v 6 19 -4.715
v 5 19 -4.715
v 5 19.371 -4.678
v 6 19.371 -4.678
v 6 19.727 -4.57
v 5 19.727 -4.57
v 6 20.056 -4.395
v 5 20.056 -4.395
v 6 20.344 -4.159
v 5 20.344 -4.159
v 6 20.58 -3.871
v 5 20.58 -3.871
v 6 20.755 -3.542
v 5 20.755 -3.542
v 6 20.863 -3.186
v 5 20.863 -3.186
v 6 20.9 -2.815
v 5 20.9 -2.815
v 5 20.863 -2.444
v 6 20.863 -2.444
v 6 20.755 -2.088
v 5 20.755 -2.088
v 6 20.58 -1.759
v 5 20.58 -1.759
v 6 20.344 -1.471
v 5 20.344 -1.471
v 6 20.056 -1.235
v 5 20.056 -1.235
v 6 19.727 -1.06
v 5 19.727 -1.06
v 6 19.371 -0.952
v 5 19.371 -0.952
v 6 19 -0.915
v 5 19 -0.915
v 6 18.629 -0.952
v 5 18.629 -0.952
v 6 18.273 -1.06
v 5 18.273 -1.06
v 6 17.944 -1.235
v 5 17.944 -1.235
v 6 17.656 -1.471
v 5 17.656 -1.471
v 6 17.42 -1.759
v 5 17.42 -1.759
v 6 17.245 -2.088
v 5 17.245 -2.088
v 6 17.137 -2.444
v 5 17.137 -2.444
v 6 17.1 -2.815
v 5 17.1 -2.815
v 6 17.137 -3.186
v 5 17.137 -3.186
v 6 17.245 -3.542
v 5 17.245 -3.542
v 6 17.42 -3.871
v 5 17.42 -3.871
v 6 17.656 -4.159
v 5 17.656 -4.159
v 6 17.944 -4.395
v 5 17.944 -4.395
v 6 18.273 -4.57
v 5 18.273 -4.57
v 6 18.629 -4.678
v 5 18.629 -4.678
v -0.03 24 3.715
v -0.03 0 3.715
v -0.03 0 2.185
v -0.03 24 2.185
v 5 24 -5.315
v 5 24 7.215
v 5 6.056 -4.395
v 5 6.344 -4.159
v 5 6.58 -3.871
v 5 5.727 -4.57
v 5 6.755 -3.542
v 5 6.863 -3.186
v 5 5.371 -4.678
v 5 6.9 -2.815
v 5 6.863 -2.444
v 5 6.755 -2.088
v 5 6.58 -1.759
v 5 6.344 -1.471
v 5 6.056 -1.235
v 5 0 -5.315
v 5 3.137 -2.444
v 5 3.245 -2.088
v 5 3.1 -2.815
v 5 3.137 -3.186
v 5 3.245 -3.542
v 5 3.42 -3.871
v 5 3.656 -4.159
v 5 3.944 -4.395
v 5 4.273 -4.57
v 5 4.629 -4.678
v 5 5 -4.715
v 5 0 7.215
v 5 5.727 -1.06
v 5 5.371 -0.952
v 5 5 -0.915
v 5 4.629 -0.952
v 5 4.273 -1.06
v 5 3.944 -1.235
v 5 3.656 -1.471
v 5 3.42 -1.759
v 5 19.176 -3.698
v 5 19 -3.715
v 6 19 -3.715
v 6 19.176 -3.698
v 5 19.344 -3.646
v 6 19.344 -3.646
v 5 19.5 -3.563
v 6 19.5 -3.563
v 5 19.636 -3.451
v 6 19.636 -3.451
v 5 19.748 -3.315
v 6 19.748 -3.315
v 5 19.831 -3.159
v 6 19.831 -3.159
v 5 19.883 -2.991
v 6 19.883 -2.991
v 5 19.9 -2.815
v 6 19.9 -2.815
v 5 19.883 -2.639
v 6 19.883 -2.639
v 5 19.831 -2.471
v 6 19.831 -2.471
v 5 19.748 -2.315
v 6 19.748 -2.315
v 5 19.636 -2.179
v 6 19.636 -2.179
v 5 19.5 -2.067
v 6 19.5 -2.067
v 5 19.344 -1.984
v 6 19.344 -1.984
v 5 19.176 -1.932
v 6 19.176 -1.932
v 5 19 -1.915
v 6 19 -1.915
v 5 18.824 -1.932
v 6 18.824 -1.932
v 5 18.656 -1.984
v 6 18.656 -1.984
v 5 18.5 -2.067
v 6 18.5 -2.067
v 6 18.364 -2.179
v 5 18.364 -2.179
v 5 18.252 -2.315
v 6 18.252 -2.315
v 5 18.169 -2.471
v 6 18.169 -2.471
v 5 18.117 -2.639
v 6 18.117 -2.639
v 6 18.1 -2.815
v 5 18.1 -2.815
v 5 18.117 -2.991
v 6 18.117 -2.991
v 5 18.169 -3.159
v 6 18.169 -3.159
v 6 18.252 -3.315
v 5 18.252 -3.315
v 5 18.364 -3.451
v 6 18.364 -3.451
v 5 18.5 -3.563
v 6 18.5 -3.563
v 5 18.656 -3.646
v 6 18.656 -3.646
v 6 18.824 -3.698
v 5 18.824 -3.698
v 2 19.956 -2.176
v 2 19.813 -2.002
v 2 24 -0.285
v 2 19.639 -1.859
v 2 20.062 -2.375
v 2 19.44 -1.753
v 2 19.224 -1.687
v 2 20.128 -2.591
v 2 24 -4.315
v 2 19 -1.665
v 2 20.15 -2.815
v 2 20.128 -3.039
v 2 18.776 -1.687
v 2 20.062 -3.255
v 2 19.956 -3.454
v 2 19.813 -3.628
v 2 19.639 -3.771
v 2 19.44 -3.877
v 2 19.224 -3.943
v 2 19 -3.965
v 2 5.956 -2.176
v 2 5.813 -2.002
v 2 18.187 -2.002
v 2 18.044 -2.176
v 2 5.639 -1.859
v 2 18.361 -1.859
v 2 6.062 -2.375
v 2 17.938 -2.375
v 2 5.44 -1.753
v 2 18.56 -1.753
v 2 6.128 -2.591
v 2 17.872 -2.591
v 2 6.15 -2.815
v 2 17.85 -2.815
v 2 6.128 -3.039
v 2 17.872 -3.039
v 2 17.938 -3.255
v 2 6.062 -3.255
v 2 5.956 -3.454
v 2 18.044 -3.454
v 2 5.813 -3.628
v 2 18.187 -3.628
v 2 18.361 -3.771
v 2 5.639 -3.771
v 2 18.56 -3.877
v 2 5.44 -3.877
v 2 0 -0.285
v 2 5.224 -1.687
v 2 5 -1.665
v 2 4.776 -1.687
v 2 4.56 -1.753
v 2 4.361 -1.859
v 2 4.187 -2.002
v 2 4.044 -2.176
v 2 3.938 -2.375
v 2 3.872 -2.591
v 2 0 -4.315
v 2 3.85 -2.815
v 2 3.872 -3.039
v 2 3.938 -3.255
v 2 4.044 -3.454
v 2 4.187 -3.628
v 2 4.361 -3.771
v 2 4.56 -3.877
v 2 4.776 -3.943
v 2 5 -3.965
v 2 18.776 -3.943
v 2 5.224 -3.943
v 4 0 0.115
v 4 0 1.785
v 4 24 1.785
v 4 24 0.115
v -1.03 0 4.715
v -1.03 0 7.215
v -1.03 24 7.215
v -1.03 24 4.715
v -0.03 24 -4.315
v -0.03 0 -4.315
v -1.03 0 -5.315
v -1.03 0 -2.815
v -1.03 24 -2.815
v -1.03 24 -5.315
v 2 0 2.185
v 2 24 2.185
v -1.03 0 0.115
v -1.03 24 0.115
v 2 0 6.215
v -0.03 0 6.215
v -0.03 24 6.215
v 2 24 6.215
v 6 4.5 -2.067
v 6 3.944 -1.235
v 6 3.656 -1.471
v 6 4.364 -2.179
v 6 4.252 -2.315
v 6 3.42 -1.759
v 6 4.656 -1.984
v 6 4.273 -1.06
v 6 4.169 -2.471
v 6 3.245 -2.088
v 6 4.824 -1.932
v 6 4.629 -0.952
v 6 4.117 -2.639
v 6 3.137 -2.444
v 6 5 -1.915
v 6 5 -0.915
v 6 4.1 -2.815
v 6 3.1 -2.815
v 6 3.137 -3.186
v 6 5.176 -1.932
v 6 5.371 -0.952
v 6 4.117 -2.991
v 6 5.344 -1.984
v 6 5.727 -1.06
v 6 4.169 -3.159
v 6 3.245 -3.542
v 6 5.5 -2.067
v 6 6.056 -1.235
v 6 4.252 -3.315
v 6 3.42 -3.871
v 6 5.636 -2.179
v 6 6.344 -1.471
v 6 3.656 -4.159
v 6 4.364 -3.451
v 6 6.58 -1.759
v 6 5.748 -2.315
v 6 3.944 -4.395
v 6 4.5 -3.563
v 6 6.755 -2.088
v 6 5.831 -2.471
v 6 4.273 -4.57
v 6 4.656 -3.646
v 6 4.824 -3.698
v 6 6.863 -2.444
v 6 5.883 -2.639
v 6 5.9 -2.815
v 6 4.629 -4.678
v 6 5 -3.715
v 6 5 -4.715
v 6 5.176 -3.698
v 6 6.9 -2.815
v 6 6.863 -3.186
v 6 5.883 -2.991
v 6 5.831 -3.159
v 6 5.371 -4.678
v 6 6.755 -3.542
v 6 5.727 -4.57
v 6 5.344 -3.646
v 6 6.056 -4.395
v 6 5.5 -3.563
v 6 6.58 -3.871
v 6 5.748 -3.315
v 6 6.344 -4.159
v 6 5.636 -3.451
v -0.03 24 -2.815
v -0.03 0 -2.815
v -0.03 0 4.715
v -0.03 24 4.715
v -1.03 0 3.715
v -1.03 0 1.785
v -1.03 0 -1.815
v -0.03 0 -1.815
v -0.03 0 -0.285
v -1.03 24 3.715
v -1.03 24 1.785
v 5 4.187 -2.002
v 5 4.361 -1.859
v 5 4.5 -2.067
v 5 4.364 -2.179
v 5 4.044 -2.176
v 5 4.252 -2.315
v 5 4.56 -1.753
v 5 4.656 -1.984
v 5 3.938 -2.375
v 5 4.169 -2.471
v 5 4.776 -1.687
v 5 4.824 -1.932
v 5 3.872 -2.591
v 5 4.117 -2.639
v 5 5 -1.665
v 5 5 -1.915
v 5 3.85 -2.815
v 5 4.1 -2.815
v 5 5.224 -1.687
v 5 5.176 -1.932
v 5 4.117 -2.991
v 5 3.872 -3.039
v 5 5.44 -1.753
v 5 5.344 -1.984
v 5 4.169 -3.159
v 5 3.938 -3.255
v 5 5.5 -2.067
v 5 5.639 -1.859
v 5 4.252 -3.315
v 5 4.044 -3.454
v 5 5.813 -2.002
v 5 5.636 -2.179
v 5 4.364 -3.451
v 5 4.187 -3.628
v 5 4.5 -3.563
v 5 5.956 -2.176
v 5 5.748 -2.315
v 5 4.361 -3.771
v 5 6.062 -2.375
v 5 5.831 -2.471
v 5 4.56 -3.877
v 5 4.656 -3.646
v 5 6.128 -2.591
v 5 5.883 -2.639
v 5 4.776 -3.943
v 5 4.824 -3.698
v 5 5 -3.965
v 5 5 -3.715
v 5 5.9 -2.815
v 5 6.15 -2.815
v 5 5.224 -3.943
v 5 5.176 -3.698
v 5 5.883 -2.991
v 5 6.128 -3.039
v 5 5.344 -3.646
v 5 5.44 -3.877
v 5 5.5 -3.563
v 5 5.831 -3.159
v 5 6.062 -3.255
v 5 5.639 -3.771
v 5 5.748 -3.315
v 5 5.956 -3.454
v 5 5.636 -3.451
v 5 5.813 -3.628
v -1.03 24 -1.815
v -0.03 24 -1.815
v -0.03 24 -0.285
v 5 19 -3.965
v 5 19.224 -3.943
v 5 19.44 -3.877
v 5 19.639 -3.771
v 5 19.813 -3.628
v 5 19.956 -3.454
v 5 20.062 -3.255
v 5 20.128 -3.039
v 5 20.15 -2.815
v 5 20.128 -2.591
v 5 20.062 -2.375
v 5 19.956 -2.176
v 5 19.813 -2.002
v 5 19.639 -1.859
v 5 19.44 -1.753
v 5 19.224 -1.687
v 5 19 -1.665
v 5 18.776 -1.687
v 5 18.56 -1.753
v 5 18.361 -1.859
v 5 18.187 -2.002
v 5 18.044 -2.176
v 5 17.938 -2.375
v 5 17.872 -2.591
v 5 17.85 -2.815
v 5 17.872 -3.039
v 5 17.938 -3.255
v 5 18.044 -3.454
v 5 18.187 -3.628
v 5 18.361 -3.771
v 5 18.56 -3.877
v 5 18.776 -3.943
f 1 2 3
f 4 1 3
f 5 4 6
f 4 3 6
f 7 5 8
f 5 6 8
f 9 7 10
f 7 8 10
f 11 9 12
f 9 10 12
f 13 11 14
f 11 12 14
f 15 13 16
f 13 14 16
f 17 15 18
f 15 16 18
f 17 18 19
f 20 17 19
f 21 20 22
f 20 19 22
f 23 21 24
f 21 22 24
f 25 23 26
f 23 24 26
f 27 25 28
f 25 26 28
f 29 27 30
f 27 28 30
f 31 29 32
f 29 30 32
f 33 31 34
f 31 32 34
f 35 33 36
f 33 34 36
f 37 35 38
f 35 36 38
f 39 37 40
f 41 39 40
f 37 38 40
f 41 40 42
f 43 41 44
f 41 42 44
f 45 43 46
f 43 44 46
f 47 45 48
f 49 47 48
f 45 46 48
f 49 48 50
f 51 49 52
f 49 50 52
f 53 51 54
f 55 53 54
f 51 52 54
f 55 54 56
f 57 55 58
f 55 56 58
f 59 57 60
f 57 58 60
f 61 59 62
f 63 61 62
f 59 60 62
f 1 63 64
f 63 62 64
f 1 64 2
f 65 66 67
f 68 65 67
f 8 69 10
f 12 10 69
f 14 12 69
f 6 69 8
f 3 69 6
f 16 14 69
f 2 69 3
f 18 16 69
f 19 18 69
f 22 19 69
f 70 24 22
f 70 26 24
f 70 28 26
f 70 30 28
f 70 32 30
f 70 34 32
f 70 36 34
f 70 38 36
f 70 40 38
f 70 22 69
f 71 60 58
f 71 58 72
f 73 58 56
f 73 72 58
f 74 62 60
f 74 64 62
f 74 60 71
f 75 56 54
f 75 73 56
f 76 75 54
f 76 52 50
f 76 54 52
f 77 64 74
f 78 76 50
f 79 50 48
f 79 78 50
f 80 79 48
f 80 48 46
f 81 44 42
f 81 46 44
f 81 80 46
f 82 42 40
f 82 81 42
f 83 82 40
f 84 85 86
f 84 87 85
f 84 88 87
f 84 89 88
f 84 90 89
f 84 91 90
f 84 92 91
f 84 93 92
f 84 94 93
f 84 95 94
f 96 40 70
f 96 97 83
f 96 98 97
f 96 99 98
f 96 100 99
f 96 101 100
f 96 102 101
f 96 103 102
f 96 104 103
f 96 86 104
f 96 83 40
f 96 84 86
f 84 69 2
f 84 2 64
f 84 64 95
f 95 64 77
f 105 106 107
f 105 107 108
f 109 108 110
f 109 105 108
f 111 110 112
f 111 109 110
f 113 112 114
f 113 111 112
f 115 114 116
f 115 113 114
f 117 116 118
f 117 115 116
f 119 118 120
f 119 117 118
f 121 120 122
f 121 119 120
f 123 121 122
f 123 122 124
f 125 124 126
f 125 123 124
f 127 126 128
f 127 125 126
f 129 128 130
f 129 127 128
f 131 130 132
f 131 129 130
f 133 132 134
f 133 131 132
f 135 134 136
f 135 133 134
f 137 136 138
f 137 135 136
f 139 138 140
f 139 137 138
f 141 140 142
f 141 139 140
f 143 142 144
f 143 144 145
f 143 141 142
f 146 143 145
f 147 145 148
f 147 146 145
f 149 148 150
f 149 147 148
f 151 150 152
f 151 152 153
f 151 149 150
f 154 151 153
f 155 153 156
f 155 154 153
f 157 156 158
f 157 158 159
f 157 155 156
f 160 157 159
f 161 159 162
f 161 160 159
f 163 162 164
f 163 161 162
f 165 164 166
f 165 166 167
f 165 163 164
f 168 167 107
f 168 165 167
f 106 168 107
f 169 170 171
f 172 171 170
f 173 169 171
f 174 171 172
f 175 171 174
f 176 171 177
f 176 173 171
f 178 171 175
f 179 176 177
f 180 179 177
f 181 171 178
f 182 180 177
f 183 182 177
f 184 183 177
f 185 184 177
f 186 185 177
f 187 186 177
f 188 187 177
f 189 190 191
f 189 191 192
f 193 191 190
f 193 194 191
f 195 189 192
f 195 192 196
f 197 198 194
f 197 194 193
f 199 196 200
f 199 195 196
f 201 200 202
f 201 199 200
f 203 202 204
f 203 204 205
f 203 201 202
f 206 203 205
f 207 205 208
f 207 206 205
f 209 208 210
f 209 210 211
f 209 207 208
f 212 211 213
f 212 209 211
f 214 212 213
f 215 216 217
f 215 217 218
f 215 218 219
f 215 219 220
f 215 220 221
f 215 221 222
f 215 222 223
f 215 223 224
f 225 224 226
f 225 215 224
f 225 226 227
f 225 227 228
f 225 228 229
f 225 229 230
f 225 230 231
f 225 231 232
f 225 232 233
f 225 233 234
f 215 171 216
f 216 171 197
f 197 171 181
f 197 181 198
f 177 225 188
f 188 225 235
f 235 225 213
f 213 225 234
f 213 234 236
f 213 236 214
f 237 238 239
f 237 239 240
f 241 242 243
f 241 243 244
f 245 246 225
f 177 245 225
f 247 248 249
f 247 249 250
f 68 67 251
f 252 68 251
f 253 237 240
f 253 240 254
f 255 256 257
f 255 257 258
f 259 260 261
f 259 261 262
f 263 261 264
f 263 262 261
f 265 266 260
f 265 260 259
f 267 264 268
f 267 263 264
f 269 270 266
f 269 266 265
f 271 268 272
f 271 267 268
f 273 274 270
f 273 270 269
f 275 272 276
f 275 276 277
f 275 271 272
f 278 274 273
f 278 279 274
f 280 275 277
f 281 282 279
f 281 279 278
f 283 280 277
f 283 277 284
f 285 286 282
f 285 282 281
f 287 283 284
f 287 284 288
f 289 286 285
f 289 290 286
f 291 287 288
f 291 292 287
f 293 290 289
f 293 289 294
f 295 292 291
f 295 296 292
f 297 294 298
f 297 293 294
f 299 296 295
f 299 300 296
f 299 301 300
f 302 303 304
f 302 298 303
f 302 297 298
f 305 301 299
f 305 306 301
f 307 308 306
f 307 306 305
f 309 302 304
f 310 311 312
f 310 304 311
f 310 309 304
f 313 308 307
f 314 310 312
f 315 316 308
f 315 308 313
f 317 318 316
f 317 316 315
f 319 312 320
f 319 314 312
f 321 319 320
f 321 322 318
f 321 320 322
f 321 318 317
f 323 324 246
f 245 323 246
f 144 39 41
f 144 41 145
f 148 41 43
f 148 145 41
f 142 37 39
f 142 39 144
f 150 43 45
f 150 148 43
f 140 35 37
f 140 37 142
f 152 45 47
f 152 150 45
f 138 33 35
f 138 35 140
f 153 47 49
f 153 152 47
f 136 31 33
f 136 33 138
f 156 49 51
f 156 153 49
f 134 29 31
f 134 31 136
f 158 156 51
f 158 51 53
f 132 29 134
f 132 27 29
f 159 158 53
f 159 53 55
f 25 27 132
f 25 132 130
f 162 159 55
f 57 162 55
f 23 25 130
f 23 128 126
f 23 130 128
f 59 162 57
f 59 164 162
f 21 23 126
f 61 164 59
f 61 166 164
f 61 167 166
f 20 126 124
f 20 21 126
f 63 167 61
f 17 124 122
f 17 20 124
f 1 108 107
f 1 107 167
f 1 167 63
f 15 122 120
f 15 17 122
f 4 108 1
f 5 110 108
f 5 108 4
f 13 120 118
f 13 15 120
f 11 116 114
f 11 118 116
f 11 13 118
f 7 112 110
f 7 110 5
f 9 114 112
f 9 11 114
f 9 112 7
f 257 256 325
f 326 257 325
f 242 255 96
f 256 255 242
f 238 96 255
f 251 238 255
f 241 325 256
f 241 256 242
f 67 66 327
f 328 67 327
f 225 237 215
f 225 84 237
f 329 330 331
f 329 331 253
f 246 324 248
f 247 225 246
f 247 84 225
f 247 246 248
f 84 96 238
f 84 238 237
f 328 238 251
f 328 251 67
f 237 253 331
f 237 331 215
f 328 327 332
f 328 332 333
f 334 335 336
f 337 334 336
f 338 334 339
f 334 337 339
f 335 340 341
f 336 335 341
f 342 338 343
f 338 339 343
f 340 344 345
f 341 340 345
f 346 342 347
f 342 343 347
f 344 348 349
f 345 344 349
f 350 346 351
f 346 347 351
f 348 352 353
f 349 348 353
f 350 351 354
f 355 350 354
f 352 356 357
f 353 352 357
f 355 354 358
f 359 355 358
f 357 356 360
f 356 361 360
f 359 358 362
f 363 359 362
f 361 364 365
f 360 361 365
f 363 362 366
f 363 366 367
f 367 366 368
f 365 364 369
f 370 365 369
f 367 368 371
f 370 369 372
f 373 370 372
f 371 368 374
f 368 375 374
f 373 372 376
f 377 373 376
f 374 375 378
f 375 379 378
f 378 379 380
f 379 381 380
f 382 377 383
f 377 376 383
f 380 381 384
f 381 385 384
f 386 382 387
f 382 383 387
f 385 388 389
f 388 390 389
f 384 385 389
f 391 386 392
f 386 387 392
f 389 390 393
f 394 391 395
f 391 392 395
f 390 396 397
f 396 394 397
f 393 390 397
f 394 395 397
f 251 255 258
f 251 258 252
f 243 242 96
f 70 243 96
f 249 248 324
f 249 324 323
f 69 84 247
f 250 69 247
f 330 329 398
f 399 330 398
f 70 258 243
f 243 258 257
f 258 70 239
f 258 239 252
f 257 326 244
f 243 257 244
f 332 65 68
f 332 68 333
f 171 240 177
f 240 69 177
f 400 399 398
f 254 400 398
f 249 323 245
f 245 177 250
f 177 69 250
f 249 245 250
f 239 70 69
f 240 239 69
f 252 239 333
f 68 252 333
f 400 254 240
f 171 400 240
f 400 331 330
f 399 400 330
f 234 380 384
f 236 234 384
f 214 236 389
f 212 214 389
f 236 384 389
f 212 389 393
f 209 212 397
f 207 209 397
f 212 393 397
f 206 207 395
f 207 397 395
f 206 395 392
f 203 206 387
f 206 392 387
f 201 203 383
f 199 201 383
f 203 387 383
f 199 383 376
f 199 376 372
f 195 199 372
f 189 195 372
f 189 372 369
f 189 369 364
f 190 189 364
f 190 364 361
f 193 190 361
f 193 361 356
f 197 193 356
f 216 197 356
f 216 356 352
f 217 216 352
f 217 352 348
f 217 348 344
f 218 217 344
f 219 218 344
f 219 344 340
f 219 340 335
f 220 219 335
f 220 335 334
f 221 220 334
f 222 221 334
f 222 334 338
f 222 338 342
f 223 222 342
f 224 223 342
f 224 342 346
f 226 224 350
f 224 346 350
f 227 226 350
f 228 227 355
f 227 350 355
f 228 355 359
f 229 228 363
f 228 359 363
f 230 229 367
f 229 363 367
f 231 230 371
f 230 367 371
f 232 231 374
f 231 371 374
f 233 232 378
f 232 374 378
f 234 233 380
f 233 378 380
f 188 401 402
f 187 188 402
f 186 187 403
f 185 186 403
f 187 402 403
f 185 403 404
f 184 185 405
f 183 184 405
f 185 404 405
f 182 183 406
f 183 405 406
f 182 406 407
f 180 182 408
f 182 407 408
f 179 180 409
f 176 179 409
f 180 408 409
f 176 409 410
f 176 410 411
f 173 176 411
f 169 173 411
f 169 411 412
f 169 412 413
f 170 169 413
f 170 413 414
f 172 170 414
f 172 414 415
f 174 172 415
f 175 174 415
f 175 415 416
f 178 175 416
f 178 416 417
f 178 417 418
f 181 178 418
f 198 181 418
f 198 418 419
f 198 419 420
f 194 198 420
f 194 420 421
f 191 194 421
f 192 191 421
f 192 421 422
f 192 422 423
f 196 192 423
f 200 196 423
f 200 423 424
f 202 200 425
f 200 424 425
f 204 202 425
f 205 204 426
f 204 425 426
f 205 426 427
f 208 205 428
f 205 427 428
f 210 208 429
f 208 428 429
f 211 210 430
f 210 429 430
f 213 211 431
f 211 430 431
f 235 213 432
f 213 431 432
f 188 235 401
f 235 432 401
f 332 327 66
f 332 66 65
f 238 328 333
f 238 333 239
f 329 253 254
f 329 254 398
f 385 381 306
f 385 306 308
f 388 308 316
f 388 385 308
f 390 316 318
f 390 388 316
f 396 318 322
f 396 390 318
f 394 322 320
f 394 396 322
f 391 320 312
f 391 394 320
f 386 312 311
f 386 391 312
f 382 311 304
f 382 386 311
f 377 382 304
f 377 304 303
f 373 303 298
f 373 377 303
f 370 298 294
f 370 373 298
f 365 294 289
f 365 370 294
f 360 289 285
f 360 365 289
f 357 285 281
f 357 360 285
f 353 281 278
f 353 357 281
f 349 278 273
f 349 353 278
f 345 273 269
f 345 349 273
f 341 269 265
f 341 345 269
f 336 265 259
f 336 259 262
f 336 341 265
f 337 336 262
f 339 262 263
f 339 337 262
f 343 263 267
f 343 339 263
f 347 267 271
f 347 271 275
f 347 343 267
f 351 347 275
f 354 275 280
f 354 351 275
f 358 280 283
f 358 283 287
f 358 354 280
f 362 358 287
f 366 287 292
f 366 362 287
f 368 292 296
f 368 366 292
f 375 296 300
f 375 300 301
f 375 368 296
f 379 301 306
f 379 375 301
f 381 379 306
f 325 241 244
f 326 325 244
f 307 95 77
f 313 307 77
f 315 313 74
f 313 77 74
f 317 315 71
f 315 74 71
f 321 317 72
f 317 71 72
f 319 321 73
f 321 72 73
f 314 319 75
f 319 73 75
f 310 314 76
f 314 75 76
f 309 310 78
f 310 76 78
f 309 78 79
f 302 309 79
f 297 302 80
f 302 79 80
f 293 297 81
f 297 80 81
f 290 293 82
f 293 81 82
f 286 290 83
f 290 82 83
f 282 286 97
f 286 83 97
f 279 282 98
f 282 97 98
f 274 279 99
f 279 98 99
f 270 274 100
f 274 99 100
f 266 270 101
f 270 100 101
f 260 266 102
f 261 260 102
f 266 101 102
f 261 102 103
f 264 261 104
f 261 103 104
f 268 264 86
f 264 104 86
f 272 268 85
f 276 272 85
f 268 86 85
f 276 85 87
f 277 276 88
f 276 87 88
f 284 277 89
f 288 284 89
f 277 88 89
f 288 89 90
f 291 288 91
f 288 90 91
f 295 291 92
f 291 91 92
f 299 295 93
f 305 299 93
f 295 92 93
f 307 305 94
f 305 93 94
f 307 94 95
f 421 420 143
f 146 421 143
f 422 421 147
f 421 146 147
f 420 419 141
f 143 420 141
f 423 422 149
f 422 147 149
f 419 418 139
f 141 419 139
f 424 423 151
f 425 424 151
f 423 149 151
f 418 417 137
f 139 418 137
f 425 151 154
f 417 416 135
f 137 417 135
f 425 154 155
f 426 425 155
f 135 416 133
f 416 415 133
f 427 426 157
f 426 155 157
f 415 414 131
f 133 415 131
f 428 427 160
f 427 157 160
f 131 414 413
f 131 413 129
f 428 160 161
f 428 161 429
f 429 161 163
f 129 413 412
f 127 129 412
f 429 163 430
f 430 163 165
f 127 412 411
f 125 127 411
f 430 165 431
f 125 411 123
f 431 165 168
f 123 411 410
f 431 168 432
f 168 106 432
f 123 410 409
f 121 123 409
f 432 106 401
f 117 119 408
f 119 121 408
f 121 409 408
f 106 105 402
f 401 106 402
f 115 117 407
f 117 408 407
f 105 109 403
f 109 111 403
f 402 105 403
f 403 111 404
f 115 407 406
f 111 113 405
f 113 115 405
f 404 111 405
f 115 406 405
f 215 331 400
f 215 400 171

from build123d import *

# Parameters (mm, degrees)
SKETCH1_W           = 2.03
SKETCH1_H           = 4.03
BOSS_EXTRUDE1_DEPTH = 24
SKETCH2_W           = 1
SKETCH2_H           = 24
CUT_EXTRUDE1_DEPTH  = 2
SKETCH3_R           = 1.9
SKETCH3_R_2         = 0.9
BOSS_EXTRUDE2_DEPTH = 1
SKETCH4_R           = 1.15
CUT_EXTRUDE2_DEPTH  = 4


with BuildPart() as part:
    # Sketch1 → Boss-Extrude1 (new body)
    with BuildSketch(Plane(origin=(0, 0, 0), x_dir=(1, 0, 0), z_dir=(0, 1, 0))):
        Polygon((0.758759529, 5.315), (5, 5.315), (5, -7.215), (1.398203198, -7.215), (-1.03, -7.215), (-1.03, -1.785), (4, -1.785), (4, -0.115), (-1.03, -0.115), (-1.03, 5.315), align=None)
        with Locations((0.985, 2.3)):
            Rectangle(SKETCH1_W, SKETCH1_H, mode=Mode.SUBTRACT)
        with Locations((0.985, -4.2)):
            Rectangle(SKETCH1_W, SKETCH1_H, mode=Mode.SUBTRACT)
    extrude(amount=BOSS_EXTRUDE1_DEPTH)

    # Sketch2 → Cut-Extrude1 (cut)
    with BuildSketch(Plane.ZY.offset(1.03)):
        with Locations((-2.315, 12)):
            Rectangle(SKETCH2_W, SKETCH2_H)
        with Locations((4.215, 12)):
            Rectangle(SKETCH2_W, SKETCH2_H)
    extrude(amount=-CUT_EXTRUDE1_DEPTH, mode=Mode.SUBTRACT)

    # Sketch3 → Boss-Extrude2 (add)
    with BuildSketch(Plane(origin=(5, 0, 0), x_dir=(0, 0, -1), z_dir=(1, 0, 0))):
        with Locations((2.815, 19)):
            Circle(SKETCH3_R)
        with Locations((2.815, 19)):
            Circle(SKETCH3_R_2, mode=Mode.SUBTRACT)
        with Locations((2.815, 5)):
            Circle(SKETCH3_R)
        with Locations((2.815, 5)):
            Circle(SKETCH3_R_2, mode=Mode.SUBTRACT)
    extrude(amount=BOSS_EXTRUDE2_DEPTH)

    # Sketch4 → Cut-Extrude2 (cut)
    with BuildSketch(Plane(origin=(5, 0, 0), x_dir=(0, 0, -1), z_dir=(1, 0, 0))):
        with Locations((2.815, 19)):
            Circle(SKETCH4_R)
        with Locations((2.815, 5)):
            Circle(SKETCH4_R)
    extrude(amount=-CUT_EXTRUDE2_DEPTH, mode=Mode.SUBTRACT)


solid = part.part
